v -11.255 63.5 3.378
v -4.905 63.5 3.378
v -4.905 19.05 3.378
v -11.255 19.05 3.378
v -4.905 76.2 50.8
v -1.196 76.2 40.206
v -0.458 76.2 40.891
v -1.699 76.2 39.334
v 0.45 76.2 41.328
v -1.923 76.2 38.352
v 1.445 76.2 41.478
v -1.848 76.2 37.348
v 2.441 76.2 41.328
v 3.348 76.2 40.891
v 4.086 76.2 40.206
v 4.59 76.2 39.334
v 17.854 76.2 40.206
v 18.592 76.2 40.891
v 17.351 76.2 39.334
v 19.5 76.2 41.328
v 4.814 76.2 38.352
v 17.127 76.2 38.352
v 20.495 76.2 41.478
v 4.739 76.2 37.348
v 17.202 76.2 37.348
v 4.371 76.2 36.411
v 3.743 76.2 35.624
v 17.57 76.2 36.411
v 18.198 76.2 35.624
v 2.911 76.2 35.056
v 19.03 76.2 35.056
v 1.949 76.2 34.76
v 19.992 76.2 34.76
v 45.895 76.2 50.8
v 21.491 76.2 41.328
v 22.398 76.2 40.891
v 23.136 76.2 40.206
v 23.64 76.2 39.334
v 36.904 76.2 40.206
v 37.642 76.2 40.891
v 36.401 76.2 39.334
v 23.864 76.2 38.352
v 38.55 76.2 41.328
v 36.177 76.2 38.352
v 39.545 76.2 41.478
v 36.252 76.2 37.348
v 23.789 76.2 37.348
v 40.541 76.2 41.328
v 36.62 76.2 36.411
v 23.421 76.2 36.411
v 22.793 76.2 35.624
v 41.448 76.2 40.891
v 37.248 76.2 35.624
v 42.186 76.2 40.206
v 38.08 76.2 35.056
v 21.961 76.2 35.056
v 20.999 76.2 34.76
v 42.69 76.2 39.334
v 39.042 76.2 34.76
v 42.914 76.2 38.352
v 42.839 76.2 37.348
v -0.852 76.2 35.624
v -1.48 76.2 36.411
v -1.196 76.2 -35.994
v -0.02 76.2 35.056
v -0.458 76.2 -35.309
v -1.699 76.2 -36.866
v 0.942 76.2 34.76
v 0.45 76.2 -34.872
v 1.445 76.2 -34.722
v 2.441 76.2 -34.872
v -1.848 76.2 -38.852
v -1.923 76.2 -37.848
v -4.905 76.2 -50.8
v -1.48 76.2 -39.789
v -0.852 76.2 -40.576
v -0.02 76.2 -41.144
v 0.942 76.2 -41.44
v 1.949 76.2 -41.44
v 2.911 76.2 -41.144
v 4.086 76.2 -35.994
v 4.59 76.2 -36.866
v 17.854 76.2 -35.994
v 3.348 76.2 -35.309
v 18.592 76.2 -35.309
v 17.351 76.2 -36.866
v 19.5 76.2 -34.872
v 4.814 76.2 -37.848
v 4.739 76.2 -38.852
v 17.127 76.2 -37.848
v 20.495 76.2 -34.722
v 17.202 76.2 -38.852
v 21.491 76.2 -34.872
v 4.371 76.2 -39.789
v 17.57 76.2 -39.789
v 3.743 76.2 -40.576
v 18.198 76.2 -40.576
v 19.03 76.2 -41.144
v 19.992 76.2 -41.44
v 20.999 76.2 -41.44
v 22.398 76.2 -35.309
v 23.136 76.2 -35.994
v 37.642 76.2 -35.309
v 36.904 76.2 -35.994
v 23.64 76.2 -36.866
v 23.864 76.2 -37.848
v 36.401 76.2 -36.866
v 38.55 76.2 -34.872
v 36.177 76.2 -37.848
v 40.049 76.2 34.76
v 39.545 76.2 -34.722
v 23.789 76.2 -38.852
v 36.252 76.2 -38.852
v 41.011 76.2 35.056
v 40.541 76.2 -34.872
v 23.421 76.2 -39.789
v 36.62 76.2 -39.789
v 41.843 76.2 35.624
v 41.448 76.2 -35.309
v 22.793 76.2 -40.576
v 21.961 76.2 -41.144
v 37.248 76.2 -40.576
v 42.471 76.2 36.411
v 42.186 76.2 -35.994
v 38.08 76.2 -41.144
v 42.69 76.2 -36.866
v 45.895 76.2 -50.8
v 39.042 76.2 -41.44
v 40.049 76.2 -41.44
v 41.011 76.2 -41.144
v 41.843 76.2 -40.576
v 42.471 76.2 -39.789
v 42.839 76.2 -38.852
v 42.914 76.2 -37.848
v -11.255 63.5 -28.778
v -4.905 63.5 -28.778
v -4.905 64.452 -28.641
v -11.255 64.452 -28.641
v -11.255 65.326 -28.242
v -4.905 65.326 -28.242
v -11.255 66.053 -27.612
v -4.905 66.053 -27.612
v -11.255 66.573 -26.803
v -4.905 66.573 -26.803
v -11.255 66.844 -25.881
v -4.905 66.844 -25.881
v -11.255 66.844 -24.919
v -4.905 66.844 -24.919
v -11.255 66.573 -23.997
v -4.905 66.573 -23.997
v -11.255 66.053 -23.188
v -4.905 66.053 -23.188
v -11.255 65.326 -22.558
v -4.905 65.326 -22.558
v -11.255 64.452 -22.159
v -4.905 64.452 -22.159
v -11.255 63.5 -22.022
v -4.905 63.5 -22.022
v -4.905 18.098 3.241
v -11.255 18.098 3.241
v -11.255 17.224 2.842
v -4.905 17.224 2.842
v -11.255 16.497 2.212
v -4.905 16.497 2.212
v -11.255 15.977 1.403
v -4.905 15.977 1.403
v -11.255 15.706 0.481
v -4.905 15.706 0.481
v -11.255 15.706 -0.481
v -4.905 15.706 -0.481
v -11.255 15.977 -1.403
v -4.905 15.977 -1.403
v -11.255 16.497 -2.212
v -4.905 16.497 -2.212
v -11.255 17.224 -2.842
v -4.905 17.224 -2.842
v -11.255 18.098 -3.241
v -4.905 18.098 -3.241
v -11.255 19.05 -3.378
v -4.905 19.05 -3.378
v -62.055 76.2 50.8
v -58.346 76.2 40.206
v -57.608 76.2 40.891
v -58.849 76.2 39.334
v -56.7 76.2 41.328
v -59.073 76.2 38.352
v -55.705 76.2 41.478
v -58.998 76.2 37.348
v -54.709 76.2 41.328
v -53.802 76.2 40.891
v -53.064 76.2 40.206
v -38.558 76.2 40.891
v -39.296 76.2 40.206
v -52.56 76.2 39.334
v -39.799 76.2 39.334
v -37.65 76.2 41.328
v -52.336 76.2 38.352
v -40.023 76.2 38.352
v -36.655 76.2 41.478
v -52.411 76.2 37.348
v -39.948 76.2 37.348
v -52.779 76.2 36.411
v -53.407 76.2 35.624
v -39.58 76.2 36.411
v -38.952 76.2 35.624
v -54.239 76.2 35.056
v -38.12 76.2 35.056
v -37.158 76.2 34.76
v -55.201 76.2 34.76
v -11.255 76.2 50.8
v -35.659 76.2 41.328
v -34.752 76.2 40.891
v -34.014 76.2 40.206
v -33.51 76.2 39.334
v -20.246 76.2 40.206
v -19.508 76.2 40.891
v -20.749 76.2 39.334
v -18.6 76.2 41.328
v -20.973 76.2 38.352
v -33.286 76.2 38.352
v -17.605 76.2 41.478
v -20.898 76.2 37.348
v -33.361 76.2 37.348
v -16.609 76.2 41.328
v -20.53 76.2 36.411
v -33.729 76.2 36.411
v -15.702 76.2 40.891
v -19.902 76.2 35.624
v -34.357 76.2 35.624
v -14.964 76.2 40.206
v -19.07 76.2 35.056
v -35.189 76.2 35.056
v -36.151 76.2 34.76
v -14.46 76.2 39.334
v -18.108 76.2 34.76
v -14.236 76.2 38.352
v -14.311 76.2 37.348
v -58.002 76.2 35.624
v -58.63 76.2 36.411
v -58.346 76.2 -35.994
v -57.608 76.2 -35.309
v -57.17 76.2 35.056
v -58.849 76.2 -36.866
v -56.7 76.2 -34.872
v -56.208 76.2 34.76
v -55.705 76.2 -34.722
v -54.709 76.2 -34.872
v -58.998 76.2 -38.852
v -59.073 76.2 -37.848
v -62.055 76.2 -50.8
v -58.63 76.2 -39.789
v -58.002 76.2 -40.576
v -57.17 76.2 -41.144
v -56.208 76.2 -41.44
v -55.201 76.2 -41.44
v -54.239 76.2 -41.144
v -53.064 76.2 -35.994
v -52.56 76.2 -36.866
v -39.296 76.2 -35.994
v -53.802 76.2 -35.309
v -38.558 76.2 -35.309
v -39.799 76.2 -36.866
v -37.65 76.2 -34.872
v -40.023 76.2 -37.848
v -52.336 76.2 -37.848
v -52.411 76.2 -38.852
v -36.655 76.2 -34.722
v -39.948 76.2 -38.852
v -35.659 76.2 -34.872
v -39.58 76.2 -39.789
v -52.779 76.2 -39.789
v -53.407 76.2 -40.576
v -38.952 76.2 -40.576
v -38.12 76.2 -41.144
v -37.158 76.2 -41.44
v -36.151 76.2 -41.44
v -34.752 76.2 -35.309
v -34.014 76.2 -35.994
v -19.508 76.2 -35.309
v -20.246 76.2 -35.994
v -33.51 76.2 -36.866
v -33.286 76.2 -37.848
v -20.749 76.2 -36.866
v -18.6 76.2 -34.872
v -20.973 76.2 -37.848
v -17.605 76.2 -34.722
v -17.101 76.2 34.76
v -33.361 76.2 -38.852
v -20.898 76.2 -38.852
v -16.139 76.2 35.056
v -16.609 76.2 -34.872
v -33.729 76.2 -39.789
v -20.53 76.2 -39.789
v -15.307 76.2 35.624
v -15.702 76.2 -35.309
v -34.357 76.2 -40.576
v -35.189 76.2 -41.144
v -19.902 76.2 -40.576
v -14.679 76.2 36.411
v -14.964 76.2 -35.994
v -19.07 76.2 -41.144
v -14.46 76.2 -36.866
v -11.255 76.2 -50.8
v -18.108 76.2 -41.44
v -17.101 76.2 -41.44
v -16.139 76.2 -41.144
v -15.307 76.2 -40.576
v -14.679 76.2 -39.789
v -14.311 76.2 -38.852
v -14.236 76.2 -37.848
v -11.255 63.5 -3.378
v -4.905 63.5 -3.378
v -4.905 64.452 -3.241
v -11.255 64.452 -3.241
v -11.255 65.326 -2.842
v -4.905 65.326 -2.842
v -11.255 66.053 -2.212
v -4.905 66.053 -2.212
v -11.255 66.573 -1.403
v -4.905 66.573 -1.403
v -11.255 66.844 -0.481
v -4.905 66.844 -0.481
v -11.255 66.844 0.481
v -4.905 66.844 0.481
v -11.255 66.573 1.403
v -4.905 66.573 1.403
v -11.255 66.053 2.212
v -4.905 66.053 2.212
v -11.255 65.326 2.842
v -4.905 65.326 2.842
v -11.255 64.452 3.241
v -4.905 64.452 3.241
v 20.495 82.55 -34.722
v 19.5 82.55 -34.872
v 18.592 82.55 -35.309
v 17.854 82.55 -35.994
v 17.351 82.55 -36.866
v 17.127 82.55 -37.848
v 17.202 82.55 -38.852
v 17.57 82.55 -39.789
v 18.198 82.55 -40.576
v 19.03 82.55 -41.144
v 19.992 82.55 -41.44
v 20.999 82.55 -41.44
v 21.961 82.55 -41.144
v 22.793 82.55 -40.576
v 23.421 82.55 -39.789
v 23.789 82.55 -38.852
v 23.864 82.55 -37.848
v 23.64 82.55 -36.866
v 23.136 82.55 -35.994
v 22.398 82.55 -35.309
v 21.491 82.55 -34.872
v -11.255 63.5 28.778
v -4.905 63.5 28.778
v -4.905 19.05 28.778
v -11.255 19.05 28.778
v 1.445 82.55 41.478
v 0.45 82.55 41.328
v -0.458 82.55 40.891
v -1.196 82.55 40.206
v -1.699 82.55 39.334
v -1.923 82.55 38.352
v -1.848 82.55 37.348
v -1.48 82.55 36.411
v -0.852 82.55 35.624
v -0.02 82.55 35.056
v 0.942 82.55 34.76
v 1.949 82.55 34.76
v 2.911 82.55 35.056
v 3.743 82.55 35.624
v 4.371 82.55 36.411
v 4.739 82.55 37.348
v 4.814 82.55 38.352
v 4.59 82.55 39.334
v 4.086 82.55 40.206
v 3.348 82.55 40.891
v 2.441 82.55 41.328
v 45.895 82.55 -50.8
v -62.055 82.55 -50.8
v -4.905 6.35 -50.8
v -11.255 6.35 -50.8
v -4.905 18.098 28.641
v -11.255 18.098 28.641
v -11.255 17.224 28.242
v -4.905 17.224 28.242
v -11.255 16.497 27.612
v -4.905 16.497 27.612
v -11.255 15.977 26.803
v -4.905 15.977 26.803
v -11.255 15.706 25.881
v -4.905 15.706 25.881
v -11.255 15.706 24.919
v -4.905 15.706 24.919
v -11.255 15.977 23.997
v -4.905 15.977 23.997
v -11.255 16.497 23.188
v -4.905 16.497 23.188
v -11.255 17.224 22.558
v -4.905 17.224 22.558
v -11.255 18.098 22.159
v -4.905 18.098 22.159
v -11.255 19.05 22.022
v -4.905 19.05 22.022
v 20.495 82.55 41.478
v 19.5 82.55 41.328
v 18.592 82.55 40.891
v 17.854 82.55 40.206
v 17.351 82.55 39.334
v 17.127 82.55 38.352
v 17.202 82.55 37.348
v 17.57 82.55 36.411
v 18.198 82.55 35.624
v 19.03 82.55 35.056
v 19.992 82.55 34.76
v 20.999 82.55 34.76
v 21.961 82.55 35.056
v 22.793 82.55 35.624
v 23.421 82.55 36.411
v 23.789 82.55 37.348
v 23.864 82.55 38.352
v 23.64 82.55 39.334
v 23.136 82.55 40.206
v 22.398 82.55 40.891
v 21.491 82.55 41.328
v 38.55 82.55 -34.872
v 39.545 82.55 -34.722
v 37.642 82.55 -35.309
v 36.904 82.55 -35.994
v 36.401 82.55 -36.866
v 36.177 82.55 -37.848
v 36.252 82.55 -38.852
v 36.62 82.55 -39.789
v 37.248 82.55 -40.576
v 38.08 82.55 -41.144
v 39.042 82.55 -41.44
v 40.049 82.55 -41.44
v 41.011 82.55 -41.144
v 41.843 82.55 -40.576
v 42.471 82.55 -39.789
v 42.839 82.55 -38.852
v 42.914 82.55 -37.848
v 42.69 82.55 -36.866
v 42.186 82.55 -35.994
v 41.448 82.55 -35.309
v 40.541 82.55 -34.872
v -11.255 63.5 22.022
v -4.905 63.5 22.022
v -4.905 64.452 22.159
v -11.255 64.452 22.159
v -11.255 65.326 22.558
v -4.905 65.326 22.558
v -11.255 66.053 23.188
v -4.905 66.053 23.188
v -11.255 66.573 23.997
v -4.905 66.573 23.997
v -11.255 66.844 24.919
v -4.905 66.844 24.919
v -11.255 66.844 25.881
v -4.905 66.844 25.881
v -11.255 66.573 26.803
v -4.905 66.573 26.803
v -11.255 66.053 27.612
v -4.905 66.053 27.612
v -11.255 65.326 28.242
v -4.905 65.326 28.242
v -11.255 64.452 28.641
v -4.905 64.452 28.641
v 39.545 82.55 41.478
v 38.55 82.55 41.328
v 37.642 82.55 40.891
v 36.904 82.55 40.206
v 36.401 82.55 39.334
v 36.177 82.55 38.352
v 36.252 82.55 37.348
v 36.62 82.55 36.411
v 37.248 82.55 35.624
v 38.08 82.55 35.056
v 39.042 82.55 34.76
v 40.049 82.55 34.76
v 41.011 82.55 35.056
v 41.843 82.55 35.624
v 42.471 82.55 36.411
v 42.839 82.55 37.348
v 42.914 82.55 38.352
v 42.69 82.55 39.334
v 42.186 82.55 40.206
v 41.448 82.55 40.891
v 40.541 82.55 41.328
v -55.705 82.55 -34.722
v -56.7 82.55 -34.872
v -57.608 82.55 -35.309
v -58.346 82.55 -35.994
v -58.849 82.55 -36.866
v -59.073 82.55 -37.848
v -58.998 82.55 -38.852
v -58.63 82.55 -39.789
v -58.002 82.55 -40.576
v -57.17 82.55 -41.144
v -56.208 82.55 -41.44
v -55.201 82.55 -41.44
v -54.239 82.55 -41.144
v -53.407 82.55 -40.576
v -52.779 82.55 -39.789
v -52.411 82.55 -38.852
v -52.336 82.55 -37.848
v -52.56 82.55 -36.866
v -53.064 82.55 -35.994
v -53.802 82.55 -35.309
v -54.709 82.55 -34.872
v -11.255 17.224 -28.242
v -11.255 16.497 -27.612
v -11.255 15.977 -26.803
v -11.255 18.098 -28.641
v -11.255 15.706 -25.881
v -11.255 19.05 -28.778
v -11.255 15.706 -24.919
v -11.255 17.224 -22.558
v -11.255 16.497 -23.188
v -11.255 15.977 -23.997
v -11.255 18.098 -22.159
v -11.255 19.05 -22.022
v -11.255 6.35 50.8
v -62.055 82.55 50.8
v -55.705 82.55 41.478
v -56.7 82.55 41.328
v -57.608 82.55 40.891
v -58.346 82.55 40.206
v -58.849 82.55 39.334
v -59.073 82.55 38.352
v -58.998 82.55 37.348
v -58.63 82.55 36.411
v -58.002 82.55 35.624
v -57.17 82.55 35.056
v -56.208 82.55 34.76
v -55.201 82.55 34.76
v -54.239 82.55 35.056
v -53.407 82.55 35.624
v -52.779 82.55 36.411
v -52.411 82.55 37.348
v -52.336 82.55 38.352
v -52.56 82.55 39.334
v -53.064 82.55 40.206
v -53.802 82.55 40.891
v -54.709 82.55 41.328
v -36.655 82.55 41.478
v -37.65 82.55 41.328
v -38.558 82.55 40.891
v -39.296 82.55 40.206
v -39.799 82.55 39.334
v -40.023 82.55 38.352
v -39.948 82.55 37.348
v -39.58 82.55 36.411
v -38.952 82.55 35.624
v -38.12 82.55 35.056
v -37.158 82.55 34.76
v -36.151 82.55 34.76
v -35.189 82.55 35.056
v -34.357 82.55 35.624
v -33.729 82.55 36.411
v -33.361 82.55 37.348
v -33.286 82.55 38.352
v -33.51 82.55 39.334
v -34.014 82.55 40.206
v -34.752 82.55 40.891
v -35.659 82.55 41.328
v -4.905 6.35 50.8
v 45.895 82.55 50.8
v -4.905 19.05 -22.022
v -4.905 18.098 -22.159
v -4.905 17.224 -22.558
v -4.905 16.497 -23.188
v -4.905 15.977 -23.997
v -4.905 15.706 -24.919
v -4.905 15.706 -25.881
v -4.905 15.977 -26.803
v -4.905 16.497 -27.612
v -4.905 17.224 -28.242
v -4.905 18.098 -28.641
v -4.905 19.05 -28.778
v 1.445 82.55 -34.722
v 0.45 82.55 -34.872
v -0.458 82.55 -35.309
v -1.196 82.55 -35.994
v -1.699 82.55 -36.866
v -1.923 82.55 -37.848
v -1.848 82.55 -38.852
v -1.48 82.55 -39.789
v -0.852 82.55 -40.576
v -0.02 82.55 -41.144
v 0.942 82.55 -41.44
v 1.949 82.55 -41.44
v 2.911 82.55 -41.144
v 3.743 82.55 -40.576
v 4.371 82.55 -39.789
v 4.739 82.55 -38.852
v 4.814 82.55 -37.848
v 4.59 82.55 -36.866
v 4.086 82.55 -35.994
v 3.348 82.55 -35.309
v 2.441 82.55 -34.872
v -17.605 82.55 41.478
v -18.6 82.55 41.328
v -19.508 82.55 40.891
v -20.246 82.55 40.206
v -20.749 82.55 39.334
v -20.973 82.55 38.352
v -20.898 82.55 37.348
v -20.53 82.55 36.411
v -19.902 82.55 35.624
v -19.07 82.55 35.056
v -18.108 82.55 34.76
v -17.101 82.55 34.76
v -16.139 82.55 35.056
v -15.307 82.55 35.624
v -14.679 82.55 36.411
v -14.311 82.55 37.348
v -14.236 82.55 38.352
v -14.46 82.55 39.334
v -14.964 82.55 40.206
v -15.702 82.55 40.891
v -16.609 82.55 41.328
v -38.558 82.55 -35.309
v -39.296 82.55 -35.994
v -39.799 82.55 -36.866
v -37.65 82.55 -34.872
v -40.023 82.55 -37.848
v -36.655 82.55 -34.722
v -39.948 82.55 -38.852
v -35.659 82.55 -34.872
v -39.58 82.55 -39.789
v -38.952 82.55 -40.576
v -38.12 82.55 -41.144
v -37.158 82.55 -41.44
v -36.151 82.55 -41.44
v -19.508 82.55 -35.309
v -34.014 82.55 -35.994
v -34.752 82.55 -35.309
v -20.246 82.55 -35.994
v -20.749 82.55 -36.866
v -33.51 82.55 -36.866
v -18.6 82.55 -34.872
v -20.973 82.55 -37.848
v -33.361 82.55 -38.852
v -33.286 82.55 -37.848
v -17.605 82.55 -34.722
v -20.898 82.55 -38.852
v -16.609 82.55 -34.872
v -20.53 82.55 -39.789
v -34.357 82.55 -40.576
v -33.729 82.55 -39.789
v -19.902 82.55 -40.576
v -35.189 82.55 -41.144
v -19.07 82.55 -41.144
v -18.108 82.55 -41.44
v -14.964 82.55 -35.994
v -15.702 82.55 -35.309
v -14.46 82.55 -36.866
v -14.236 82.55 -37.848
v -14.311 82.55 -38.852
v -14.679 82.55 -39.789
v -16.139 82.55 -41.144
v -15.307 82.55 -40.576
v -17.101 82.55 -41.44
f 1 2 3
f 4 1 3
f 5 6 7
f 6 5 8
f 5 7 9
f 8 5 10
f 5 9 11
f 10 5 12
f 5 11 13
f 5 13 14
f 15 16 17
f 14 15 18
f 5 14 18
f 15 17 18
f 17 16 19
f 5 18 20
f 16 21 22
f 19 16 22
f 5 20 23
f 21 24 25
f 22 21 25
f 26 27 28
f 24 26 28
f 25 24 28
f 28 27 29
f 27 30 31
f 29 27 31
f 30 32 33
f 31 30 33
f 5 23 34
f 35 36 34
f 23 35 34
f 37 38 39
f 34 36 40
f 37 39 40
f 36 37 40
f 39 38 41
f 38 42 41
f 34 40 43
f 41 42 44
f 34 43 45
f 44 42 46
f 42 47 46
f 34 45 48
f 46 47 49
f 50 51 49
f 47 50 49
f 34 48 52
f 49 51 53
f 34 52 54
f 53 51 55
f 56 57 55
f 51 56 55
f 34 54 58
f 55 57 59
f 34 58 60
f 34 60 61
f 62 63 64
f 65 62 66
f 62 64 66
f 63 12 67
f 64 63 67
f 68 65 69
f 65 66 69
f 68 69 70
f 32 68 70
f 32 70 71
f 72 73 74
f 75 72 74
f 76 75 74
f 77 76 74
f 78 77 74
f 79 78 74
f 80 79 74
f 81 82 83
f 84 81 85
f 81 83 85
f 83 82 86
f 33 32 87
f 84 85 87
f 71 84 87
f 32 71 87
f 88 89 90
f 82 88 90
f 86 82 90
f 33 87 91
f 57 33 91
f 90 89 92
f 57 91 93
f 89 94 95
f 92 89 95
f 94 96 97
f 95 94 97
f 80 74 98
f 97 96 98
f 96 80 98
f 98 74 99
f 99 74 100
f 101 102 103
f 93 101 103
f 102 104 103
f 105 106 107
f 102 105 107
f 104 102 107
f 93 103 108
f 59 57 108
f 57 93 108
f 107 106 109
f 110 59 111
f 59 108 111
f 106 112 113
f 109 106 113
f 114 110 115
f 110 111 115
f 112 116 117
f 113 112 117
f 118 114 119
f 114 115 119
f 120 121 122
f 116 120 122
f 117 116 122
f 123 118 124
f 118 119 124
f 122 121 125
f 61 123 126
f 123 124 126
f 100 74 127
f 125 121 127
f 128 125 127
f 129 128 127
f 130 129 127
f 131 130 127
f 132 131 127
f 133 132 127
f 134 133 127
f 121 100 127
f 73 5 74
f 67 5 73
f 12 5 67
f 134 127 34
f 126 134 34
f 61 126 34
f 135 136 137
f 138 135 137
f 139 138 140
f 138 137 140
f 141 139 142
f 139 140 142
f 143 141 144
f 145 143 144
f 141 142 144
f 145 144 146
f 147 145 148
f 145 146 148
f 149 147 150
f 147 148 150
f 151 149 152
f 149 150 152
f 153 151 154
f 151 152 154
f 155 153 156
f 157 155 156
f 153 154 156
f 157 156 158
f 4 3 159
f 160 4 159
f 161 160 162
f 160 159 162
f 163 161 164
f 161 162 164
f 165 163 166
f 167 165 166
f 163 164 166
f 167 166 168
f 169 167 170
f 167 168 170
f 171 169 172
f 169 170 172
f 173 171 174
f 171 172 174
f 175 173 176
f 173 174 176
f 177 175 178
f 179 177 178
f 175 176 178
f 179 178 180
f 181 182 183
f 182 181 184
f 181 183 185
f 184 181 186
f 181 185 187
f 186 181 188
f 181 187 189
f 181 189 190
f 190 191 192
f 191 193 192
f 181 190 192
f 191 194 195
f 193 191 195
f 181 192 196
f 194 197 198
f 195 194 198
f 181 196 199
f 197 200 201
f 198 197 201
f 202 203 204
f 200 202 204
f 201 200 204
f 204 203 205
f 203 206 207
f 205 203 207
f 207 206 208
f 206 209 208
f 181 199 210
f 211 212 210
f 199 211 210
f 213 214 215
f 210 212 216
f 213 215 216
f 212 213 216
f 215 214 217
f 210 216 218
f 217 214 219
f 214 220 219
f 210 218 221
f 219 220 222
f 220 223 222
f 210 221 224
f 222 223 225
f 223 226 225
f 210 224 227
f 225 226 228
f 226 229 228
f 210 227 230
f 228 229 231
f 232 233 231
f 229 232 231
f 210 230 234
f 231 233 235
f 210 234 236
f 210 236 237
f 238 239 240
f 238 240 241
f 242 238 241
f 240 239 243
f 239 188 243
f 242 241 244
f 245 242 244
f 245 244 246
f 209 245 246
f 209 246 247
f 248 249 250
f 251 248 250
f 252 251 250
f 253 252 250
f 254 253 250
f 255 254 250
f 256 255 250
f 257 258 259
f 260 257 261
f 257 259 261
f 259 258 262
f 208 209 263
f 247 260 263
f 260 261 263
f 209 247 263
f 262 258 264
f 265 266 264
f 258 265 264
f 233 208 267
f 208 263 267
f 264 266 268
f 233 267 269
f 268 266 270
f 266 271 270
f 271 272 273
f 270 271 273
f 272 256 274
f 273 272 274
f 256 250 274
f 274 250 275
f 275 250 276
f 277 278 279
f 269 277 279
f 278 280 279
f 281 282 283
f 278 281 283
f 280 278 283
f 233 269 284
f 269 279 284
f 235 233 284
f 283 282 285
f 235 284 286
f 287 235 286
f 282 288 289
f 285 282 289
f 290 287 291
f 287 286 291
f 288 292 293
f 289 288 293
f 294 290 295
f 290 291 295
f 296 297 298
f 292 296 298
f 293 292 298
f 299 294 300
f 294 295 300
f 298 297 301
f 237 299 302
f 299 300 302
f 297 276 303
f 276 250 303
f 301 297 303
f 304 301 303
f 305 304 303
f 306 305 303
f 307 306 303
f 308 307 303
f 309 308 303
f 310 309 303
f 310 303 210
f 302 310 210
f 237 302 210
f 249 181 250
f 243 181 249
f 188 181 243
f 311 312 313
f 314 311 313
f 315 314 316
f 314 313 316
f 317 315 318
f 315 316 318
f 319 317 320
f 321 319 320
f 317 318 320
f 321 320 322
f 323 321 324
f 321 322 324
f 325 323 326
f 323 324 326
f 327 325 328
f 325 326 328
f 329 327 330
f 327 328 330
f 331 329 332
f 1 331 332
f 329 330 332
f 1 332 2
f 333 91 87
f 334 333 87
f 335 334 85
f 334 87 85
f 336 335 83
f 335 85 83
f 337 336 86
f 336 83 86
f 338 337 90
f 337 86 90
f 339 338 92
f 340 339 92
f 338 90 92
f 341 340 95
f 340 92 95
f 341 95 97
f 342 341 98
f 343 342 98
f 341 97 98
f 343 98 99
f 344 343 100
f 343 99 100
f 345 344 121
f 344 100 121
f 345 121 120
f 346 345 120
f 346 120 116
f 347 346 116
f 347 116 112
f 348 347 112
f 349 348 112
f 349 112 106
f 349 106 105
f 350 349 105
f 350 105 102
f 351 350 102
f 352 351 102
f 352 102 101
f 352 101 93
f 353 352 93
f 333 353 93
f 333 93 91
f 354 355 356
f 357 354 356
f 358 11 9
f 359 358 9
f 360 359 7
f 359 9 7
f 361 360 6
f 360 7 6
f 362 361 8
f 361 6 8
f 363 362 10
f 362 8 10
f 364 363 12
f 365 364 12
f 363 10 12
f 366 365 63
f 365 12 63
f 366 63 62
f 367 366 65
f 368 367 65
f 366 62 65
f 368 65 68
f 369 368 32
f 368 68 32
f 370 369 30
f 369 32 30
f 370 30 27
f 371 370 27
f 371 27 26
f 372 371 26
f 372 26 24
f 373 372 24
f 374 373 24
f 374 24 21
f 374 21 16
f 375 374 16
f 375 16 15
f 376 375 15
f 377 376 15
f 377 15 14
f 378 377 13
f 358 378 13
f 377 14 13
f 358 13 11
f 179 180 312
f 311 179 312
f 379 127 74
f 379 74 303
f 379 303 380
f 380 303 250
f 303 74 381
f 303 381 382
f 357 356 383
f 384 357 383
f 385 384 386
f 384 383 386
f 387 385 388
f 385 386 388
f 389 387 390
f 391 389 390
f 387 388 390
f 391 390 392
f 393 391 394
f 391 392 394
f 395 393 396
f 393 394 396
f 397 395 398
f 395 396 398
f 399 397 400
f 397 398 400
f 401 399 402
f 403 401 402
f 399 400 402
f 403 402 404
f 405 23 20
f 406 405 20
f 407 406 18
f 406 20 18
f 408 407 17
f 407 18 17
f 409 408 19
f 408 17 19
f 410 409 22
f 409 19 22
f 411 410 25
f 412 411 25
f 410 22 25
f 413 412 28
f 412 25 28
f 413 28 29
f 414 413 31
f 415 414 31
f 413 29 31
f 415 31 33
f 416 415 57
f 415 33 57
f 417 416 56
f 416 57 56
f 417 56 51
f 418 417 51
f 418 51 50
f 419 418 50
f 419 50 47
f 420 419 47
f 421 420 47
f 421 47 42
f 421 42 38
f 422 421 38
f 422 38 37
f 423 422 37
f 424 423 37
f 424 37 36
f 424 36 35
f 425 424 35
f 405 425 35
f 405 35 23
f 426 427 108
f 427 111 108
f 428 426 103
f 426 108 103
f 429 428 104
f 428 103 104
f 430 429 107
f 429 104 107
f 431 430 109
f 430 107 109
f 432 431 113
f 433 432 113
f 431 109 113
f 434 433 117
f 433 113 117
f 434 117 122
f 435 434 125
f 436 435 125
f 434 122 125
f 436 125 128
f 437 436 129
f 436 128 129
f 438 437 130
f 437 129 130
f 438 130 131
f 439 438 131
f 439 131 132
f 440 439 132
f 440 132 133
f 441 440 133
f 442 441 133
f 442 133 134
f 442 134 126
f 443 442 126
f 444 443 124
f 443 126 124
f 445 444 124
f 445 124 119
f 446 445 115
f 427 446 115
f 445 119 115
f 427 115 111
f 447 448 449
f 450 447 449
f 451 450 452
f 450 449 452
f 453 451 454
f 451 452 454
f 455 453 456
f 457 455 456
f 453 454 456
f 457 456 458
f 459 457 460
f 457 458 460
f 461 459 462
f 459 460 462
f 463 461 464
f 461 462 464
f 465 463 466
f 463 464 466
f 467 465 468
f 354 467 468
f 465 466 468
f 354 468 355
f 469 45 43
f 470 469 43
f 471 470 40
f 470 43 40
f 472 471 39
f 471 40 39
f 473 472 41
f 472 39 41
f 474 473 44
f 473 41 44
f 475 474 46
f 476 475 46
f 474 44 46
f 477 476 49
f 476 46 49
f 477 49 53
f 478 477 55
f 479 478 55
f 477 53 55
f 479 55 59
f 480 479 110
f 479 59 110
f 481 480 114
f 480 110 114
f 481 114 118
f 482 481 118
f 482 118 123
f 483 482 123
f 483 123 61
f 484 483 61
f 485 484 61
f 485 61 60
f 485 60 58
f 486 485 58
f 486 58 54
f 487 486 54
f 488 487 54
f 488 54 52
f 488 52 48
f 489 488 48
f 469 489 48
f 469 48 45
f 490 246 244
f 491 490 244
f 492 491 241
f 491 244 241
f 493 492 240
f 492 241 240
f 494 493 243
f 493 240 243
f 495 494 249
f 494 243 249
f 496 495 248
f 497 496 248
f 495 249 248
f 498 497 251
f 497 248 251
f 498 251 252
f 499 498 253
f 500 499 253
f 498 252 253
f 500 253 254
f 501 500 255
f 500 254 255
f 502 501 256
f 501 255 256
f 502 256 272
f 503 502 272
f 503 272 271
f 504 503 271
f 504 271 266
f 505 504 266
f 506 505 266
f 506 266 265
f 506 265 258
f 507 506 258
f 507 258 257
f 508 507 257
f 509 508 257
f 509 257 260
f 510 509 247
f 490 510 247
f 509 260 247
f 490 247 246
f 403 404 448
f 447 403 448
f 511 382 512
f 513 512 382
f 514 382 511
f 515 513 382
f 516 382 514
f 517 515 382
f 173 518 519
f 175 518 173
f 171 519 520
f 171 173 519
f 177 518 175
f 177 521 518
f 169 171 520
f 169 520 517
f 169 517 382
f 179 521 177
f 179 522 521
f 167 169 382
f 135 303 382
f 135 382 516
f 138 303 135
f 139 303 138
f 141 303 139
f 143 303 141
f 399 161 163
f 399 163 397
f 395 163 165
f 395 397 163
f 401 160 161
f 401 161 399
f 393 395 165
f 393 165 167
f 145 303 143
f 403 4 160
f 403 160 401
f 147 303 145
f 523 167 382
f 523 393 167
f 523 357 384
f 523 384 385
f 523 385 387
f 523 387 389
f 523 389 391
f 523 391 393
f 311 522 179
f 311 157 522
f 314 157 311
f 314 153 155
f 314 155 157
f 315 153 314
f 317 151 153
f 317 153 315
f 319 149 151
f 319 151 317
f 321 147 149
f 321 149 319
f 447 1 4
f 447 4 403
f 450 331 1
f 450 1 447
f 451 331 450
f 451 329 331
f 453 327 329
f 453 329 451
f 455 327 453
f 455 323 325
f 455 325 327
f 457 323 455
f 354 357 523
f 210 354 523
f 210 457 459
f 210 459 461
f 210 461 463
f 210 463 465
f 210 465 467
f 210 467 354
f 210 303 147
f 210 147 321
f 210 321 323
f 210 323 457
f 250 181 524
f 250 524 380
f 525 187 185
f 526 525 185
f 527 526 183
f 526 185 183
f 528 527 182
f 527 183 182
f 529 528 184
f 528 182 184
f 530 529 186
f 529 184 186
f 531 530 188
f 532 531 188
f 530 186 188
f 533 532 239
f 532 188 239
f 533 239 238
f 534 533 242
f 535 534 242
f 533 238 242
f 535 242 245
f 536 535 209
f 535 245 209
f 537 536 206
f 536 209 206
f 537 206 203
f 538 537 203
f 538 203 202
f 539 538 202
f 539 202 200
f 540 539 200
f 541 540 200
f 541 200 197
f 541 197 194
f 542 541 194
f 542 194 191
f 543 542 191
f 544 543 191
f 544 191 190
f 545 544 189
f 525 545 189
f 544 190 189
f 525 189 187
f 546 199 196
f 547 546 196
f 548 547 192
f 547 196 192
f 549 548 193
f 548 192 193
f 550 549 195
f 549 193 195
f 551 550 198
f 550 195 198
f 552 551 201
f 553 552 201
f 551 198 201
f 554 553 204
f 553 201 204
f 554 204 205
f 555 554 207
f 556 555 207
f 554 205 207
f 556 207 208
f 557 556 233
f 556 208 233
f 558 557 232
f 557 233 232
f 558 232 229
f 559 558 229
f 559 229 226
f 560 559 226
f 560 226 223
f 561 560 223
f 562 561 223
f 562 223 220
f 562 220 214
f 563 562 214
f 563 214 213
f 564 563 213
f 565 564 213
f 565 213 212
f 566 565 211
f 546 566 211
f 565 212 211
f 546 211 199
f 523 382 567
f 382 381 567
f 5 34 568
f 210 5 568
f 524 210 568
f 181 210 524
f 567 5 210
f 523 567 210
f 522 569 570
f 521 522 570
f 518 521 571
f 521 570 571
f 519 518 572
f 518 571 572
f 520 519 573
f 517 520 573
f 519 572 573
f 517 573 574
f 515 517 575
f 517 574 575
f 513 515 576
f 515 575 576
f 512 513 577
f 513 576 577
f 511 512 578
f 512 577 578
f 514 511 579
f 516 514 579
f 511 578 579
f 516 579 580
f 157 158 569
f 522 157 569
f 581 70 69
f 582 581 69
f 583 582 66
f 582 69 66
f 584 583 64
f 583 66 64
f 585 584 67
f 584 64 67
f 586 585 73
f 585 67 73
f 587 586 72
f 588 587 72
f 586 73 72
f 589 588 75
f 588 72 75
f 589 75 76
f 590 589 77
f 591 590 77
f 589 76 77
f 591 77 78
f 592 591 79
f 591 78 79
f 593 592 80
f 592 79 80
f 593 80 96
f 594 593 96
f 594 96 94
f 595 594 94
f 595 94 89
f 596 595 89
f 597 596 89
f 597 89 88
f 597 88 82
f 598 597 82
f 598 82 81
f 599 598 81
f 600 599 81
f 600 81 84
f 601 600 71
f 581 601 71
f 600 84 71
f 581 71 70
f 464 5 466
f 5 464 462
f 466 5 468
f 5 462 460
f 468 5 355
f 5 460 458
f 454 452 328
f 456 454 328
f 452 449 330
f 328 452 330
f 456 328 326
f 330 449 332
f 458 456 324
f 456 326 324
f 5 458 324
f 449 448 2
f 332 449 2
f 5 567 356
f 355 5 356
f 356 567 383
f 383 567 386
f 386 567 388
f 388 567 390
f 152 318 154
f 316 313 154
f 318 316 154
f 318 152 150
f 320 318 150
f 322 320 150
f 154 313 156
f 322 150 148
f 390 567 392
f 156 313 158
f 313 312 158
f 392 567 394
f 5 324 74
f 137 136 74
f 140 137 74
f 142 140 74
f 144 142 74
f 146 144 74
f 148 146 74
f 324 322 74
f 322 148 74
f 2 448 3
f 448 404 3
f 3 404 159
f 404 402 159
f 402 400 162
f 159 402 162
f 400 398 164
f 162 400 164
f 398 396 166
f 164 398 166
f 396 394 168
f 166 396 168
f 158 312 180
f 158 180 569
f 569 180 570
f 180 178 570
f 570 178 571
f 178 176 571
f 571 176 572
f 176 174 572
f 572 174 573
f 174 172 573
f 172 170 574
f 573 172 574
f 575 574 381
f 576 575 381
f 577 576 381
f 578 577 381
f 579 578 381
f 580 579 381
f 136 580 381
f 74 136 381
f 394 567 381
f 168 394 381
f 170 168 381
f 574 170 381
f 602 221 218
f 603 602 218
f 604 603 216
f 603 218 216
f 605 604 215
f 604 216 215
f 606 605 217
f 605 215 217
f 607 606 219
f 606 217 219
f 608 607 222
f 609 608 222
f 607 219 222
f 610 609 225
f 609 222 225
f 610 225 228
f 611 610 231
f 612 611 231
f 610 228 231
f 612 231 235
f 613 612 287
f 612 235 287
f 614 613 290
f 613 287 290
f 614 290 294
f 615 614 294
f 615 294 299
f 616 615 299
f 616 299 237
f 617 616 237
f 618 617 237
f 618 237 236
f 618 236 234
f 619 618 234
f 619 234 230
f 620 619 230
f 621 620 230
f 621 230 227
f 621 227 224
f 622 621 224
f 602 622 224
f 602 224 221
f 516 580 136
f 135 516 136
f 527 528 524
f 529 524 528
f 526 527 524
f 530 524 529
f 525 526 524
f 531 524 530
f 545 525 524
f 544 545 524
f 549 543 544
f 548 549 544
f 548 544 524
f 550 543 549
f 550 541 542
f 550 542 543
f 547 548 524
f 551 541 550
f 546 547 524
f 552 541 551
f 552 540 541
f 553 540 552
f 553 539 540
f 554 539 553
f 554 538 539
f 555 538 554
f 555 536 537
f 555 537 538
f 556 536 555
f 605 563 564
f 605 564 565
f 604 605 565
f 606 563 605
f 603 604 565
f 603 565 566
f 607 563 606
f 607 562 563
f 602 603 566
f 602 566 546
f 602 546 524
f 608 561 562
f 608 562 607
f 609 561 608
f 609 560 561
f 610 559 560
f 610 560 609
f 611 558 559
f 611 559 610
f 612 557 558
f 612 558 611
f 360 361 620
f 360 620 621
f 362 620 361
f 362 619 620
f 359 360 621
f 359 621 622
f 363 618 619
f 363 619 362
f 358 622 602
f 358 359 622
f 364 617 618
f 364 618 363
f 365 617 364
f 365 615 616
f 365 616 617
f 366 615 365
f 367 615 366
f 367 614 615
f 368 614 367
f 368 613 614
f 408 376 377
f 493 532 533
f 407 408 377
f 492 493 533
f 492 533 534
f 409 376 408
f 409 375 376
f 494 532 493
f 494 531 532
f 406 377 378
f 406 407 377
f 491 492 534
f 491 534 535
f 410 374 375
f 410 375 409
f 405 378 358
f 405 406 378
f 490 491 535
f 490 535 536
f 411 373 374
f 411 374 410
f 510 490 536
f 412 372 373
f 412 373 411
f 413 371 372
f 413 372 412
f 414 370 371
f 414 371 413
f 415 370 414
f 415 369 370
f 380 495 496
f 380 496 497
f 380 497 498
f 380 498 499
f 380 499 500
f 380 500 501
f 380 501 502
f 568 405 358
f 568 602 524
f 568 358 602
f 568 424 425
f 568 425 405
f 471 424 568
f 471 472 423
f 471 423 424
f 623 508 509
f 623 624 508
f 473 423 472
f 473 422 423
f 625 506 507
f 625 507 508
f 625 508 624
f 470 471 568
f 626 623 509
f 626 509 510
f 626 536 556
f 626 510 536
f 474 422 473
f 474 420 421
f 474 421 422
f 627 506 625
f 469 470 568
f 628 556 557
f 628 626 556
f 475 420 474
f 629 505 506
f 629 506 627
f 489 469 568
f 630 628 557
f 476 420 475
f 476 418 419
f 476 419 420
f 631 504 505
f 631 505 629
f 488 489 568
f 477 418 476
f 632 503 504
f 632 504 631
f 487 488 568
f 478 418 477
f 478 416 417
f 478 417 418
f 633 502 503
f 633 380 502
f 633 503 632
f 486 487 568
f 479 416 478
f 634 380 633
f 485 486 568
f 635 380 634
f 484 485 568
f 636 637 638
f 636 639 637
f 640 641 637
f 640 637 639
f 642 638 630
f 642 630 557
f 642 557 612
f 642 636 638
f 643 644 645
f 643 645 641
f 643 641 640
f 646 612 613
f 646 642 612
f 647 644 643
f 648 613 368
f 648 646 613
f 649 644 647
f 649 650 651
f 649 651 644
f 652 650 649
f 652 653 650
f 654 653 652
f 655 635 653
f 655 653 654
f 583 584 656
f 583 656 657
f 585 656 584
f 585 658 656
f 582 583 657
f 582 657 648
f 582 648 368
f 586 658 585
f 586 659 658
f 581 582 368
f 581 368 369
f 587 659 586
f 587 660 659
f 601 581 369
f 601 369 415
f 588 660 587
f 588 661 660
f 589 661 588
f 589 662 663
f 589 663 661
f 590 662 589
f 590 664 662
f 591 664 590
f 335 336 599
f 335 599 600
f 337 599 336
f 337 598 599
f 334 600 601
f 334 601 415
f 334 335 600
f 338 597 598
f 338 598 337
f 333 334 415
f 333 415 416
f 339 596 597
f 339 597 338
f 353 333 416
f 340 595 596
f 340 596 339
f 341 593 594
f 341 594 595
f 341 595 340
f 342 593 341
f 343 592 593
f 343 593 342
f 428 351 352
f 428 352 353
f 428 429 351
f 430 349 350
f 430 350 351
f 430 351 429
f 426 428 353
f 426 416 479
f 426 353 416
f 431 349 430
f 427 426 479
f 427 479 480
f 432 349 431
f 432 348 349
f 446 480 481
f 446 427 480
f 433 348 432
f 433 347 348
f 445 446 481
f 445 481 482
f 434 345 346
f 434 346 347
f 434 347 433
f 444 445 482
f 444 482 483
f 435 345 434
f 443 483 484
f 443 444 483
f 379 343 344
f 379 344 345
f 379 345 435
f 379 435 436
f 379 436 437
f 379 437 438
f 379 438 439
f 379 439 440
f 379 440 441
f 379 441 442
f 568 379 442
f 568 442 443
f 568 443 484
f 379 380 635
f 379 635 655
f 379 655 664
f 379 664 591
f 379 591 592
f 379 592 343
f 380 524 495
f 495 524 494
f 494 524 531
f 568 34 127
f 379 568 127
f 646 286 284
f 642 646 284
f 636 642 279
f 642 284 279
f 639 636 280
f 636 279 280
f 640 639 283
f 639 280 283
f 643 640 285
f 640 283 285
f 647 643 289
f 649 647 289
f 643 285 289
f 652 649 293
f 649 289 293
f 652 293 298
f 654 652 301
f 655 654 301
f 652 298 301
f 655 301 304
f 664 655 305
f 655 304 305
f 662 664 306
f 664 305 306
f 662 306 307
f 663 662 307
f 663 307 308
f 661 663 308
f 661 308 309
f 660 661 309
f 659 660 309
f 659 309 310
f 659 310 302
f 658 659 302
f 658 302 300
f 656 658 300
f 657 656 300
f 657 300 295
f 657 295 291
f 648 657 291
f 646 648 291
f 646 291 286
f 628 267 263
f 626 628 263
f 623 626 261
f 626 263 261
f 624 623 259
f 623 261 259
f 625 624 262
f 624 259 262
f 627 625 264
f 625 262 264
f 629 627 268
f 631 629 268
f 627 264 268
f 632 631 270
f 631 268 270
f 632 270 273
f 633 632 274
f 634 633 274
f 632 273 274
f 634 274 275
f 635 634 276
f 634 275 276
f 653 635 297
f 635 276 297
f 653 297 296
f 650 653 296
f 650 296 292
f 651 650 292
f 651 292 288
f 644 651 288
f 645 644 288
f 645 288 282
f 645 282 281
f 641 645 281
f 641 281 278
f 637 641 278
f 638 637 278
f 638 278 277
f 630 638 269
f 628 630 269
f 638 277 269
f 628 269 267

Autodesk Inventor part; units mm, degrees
ref_plane "YZ Plane" through (0, 0, 0) normal (1, 0, 0) x (0, 1, 0)
ref_plane "XZ Plane" through (0, 0, 0) normal (0, 1, 0) x (-1, 0, 0)
ref_plane "XY Plane" through (0, 0, 0) normal (0, 0, 1) x (1, 0, 0)
sketch "Sketch1" plane through (0, 0, 0) normal (0, 1, 0) x (-1, 0, 0)
  line L0 (11.2547, 50.8) -> (-11.2547, 50.8)
  line L1 (-11.2547, 50.8) -> (-11.2547, -50.8)
  line L2 (-11.2547, -50.8) -> (11.2547, -50.8)
  line L3 (11.2547, -50.8) -> (11.2547, 50.8)
  line L4 (11.2547, 50.8) -> (-11.2547, -50.8) construction
  line L5 (-11.2547, 50.8) -> (11.2547, -50.8) construction
  point P0 (0, 0)
  dimension "d0" = 101.6
  dimension "d1" = 22.5095
extrude "Extrusion1" add sketch "Sketch1" against normal blind 6.35
sketch "Sketch2" plane through (0, 0, 0) normal (0, 1, 0) x (1, 0, 0)
  line L0 (11.2547, -50.8) -> (-11.2547, -50.8) projected
  line L1 (-11.2547, 50.8) -> (11.2547, 50.8) projected
  line L2 (-11.2547, -50.8) -> (-4.9047, -50.8)
  line L3 (-4.9047, -50.8) -> (-4.9047, 50.8)
  line L4 (-4.9047, 50.8) -> (-11.2547, 50.8)
  line L5 (-11.2547, 50.8) -> (-11.2547, -50.8)
  point P0 (0, 0)
  dimension "d4" = 6.35
extrude "Extrusion2" add sketch "Sketch2" along normal blind 76.2
sketch "Sketch3" plane through (0, 76.2, 0) normal (0, 1, 0) x (1, 0, 0)
  line L0 (11.2547, -50.8) -> (-11.2547, -50.8) projected
  line L1 (-11.2547, -50.8) -> (-62.0547, -50.8)
  line L2 (-62.0547, -50.8) -> (-62.0547, 50.8)
  line L3 (-62.0547, 50.8) -> (-11.2547, 50.8)
  line L4 (-11.2547, 50.8) -> (-11.2547, -50.8)
  line L5 (-4.9047, -50.8) -> (-4.9047, 50.8) projected
  line L6 (-4.9047, 50.8) -> (-11.2547, 50.8) projected
  line L7 (-11.2547, -50.8) -> (-4.9047, -50.8) projected
  line L8 (11.2547, -50.8) -> (11.2547, 50.8) projected
  line L9 (11.2547, 50.8) -> (-4.9047, 50.8) projected
  line L10 (-11.2547, -50.8) -> (-11.2547, 50.8) projected
  line L11 (-11.2547, -50.8) -> (-4.9047, -50.8)
  line L12 (-4.9047, -50.8) -> (-4.9047, 50.8)
  line L13 (-4.9047, 50.8) -> (-11.2547, 50.8)
  line L14 (-11.2547, 50.8) -> (-11.2547, -50.8)
  line L15 (-4.9047, -50.8) -> (45.8953, -50.8)
  line L16 (45.8953, -50.8) -> (45.8953, 50.8)
  line L17 (45.8953, 50.8) -> (-4.9047, 50.8)
  line L18 (-4.9047, 50.8) -> (-4.9047, -50.8)
  point P0 (0, 0)
  dimension "d7" = 50.8
  dimension "d8" = 50.8
extrude "Extrusion3" add sketch "Sketch3" along normal blind 6.35
sketch "Sketch4" plane through (0, 0, 0) normal (0, 1, 0) x (1, 0, 0)
  line L0 (-4.9047, -50.8) -> (11.2547, -50.8) construction
  line L1 (3.175, -50.8) -> (3.175, 50.8) construction
  line L2 (-11.2547, 50.8) -> (11.2547, 50.8) construction
  point P0 (0, 0)
  point P1 (3.175, -38.1)
  point P2 (3.175, -12.7)
  point P3 (3.175, 12.7)
  point P4 (3.175, 38.1)
  dimension "d11" = 12.7
  dimension "d14" = 25.4
hole "Hole1" at (3.175, 0, 38.1) at (3.175, 0, 12.7) at (3.175, 0, -12.7) at (3.175, 0, -38.1) direction (0, -1, 0) diameter 5.1054 end through all clearance for "Hex Machine Screw" size "#10" standard "Ansi Unified Screw Threads"
sketch "Sketch5" plane through (0, 82.55, 0) normal (0, 1, 0) x (1, 0, 0)
  line L0 (-62.0547, 50.8) -> (-62.0547, -50.8) construction
  line L1 (-62.0547, -38.1) -> (42.9055, -38.1) construction
  line L2 (-55.7047, -38.1) -> (-55.7047, 38.1) construction
  point P0 (0, 0)
  point P1 (-36.6547, -38.1)
  point P2 (-36.6547, 38.1)
  point P3 (-17.6047, -38.1)
  point P4 (-17.6047, 38.1)
  point P5 (1.4453, -38.1)
  point P6 (1.4453, 38.1)
  point P7 (20.4953, -38.1)
  point P8 (20.4953, 38.1)
  point P9 (39.5453, -38.1)
  point P10 (39.5453, 38.1)
  point P11 (58.5953, -38.1)
  point P12 (58.5953, 38.1)
  dimension "d26" = 38.1
  dimension "d27" = 76.2
  dimension "d28" = 6.35
  dimension "d31" = 76.2
  dimension "d34" = 19.05
hole "Hole2" at (-55.7047, 82.55, 38.1) at (-55.7047, 82.55, -38.1) at (-36.6547, 82.55, 38.1) at (-36.6547, 82.55, -38.1) at (-17.6047, 82.55, 38.1) at (-17.6047, 82.55, -38.1) at (1.4453, 82.55, 38.1) at (1.4453, 82.55, -38.1) at (20.4953, 82.55, 38.1) at (20.4953, 82.55, -38.1) at (39.5453, 82.55, 38.1) at (39.5453, 82.55, -38.1) at (58.5953, 82.55, 38.1) at (58.5953, 82.55, -38.1) direction (0, -1, 0) diameter 6.7564 depth 6.35 clearance for "Hex Machine Screw" size "1/4" standard "Ansi Unified Screw Threads"
sketch "Sketch8" plane through (11.2547, 0, 50.8) normal (1, 0, 0) x (0, 0, -1)
  line L0 (101.6, -6.35) -> (0, -6.35) projected
  line L1 (0, 0) -> (0, 76.2) projected
  line L2 (101.6, 0) -> (101.6, 76.2) projected
  line L3 (101.6, 0) -> (101.6, -6.35) projected
  line L4 (0, 0) -> (0, -6.35) projected
  line L5 (0, -6.35) -> (101.6, -6.35)
  line L6 (101.6, -6.35) -> (101.6, 6.35)
  line L7 (101.6, 6.35) -> (0, 6.35)
  line L8 (0, 6.35) -> (0, -6.35)
  point P0 (50.8, 0)
  point P1 (0, 6.35)
  dimension "d48" = 12.7
extrude "Extrusion5" cut sketch "Sketch8" against normal through all
sketch "Sketch9" plane through (-4.9047, 76.2, 50.8) normal (1, 0, 0) x (0, 0, -1)
  line L0 (101.6, 0) -> (0, 0) projected
  line L1 (101.6, -69.85) -> (101.6, 0) projected
  line L2 (101.6, -69.85) -> (0, -69.85) projected
  line L3 (0, -69.85) -> (0, 0) projected
  line L4 (0, -12.7) -> (101.6, -12.7) construction
  line L5 (0, -57.15) -> (101.6, -57.15) construction
  line L6 (25.4, -12.7) -> (25.4, -57.15) construction
  line L7 (22.0218, -12.7) -> (22.0218, -57.15)
  line L8 (28.7782, -57.15) -> (28.7782, -12.7)
  arc A0 (28.7782, -12.7) -> (22.0218, -12.7) centre (25.4, -12.7) ccw
  arc A1 (22.0218, -57.15) -> (28.7782, -57.15) centre (25.4, -57.15) ccw
  line L9 (50.8, -12.7) -> (50.8, -57.15) construction
  line L10 (47.4218, -12.7) -> (47.4218, -57.15)
  line L11 (54.1782, -57.15) -> (54.1782, -12.7)
  arc A2 (54.1782, -12.7) -> (47.4218, -12.7) centre (50.8, -12.7) ccw
  arc A3 (47.4218, -57.15) -> (54.1782, -57.15) centre (50.8, -57.15) ccw
  line L12 (76.2, -12.7) -> (76.2, -57.15) construction
  line L13 (72.8218, -12.7) -> (72.8218, -57.15)
  line L14 (79.5782, -57.15) -> (79.5782, -12.7)
  arc A4 (79.5782, -12.7) -> (72.8218, -12.7) centre (76.2, -12.7) ccw
  arc A5 (72.8218, -57.15) -> (79.5782, -57.15) centre (76.2, -57.15) ccw
  point P0 (50.8, -76.2)
  point P1 (25.4, -34.925)
  point P2 (50.8, -34.925)
  point P3 (76.2, -34.925)
  dimension "d51" = 12.7
  dimension "d52" = 12.7
  dimension "d53" = 25.4
  dimension "d54" = 25.4
  dimension "d55" = 25.4
  dimension "d56" = 3.3782
extrude "Extrusion6" cut sketch "Sketch9" against normal through all contours A0 L8 A1 L7 | A2 L11 A3 L10 | A4 L14 A5 L13
equation "\"d0\" = BaseLength"
equation "\"d1\" = BaseWidth"
equation "\"d2\" = BaseThickness"
equation "\"d4\" = BackWidth"
equation "\"d5\" = BackHeight"
equation "\"d7\" = TopBackExtension"
equation "\"d8\" = TopFrontExtension"
equation "\"d9\" = TopThickness"
equation "\"d11\" = offsetForFirstHole"
equation "\"d26\" = 0.5 * holeSpacingForMotorBracket"
equation "\"d27\" = holeSpacingForMotorBracket"
equation "\"d28\" = offsetForBracketHoleFromEdge"
equation "\"d34\" = holeSpacingForVariationInMotorBracketHoles"
equation "\"BaseWidth\" = 22.50948"
equation "\"BaseLength\" = 101.6"
equation "\"BaseThickness\" = 6.35"
equation "\"BackWidth\" = 6.35"
equation "\"BackHeight\" = 76.2"
equation "\"TopBackExtension\" = 50.8"
equation "\"TopFrontExtension\" = 50.8"
equation "\"TopThickness\" = 6.35"
equation "\"offsetForFirstHole\" = 12.7"
equation "\"holeSpacingForMotorBracket\" = 76.2"
equation "\"offsetForBracketHoleFromEdge\" = 6.35"
equation "\"holeSpacingForVariationInMotorBracketHoles\" = 19.05"
equation "\"deltaForSlots\" = 0.25 * BaseLength"
properties part number "pullyBracketTopPortion" material "PC/ABS Plastic"
